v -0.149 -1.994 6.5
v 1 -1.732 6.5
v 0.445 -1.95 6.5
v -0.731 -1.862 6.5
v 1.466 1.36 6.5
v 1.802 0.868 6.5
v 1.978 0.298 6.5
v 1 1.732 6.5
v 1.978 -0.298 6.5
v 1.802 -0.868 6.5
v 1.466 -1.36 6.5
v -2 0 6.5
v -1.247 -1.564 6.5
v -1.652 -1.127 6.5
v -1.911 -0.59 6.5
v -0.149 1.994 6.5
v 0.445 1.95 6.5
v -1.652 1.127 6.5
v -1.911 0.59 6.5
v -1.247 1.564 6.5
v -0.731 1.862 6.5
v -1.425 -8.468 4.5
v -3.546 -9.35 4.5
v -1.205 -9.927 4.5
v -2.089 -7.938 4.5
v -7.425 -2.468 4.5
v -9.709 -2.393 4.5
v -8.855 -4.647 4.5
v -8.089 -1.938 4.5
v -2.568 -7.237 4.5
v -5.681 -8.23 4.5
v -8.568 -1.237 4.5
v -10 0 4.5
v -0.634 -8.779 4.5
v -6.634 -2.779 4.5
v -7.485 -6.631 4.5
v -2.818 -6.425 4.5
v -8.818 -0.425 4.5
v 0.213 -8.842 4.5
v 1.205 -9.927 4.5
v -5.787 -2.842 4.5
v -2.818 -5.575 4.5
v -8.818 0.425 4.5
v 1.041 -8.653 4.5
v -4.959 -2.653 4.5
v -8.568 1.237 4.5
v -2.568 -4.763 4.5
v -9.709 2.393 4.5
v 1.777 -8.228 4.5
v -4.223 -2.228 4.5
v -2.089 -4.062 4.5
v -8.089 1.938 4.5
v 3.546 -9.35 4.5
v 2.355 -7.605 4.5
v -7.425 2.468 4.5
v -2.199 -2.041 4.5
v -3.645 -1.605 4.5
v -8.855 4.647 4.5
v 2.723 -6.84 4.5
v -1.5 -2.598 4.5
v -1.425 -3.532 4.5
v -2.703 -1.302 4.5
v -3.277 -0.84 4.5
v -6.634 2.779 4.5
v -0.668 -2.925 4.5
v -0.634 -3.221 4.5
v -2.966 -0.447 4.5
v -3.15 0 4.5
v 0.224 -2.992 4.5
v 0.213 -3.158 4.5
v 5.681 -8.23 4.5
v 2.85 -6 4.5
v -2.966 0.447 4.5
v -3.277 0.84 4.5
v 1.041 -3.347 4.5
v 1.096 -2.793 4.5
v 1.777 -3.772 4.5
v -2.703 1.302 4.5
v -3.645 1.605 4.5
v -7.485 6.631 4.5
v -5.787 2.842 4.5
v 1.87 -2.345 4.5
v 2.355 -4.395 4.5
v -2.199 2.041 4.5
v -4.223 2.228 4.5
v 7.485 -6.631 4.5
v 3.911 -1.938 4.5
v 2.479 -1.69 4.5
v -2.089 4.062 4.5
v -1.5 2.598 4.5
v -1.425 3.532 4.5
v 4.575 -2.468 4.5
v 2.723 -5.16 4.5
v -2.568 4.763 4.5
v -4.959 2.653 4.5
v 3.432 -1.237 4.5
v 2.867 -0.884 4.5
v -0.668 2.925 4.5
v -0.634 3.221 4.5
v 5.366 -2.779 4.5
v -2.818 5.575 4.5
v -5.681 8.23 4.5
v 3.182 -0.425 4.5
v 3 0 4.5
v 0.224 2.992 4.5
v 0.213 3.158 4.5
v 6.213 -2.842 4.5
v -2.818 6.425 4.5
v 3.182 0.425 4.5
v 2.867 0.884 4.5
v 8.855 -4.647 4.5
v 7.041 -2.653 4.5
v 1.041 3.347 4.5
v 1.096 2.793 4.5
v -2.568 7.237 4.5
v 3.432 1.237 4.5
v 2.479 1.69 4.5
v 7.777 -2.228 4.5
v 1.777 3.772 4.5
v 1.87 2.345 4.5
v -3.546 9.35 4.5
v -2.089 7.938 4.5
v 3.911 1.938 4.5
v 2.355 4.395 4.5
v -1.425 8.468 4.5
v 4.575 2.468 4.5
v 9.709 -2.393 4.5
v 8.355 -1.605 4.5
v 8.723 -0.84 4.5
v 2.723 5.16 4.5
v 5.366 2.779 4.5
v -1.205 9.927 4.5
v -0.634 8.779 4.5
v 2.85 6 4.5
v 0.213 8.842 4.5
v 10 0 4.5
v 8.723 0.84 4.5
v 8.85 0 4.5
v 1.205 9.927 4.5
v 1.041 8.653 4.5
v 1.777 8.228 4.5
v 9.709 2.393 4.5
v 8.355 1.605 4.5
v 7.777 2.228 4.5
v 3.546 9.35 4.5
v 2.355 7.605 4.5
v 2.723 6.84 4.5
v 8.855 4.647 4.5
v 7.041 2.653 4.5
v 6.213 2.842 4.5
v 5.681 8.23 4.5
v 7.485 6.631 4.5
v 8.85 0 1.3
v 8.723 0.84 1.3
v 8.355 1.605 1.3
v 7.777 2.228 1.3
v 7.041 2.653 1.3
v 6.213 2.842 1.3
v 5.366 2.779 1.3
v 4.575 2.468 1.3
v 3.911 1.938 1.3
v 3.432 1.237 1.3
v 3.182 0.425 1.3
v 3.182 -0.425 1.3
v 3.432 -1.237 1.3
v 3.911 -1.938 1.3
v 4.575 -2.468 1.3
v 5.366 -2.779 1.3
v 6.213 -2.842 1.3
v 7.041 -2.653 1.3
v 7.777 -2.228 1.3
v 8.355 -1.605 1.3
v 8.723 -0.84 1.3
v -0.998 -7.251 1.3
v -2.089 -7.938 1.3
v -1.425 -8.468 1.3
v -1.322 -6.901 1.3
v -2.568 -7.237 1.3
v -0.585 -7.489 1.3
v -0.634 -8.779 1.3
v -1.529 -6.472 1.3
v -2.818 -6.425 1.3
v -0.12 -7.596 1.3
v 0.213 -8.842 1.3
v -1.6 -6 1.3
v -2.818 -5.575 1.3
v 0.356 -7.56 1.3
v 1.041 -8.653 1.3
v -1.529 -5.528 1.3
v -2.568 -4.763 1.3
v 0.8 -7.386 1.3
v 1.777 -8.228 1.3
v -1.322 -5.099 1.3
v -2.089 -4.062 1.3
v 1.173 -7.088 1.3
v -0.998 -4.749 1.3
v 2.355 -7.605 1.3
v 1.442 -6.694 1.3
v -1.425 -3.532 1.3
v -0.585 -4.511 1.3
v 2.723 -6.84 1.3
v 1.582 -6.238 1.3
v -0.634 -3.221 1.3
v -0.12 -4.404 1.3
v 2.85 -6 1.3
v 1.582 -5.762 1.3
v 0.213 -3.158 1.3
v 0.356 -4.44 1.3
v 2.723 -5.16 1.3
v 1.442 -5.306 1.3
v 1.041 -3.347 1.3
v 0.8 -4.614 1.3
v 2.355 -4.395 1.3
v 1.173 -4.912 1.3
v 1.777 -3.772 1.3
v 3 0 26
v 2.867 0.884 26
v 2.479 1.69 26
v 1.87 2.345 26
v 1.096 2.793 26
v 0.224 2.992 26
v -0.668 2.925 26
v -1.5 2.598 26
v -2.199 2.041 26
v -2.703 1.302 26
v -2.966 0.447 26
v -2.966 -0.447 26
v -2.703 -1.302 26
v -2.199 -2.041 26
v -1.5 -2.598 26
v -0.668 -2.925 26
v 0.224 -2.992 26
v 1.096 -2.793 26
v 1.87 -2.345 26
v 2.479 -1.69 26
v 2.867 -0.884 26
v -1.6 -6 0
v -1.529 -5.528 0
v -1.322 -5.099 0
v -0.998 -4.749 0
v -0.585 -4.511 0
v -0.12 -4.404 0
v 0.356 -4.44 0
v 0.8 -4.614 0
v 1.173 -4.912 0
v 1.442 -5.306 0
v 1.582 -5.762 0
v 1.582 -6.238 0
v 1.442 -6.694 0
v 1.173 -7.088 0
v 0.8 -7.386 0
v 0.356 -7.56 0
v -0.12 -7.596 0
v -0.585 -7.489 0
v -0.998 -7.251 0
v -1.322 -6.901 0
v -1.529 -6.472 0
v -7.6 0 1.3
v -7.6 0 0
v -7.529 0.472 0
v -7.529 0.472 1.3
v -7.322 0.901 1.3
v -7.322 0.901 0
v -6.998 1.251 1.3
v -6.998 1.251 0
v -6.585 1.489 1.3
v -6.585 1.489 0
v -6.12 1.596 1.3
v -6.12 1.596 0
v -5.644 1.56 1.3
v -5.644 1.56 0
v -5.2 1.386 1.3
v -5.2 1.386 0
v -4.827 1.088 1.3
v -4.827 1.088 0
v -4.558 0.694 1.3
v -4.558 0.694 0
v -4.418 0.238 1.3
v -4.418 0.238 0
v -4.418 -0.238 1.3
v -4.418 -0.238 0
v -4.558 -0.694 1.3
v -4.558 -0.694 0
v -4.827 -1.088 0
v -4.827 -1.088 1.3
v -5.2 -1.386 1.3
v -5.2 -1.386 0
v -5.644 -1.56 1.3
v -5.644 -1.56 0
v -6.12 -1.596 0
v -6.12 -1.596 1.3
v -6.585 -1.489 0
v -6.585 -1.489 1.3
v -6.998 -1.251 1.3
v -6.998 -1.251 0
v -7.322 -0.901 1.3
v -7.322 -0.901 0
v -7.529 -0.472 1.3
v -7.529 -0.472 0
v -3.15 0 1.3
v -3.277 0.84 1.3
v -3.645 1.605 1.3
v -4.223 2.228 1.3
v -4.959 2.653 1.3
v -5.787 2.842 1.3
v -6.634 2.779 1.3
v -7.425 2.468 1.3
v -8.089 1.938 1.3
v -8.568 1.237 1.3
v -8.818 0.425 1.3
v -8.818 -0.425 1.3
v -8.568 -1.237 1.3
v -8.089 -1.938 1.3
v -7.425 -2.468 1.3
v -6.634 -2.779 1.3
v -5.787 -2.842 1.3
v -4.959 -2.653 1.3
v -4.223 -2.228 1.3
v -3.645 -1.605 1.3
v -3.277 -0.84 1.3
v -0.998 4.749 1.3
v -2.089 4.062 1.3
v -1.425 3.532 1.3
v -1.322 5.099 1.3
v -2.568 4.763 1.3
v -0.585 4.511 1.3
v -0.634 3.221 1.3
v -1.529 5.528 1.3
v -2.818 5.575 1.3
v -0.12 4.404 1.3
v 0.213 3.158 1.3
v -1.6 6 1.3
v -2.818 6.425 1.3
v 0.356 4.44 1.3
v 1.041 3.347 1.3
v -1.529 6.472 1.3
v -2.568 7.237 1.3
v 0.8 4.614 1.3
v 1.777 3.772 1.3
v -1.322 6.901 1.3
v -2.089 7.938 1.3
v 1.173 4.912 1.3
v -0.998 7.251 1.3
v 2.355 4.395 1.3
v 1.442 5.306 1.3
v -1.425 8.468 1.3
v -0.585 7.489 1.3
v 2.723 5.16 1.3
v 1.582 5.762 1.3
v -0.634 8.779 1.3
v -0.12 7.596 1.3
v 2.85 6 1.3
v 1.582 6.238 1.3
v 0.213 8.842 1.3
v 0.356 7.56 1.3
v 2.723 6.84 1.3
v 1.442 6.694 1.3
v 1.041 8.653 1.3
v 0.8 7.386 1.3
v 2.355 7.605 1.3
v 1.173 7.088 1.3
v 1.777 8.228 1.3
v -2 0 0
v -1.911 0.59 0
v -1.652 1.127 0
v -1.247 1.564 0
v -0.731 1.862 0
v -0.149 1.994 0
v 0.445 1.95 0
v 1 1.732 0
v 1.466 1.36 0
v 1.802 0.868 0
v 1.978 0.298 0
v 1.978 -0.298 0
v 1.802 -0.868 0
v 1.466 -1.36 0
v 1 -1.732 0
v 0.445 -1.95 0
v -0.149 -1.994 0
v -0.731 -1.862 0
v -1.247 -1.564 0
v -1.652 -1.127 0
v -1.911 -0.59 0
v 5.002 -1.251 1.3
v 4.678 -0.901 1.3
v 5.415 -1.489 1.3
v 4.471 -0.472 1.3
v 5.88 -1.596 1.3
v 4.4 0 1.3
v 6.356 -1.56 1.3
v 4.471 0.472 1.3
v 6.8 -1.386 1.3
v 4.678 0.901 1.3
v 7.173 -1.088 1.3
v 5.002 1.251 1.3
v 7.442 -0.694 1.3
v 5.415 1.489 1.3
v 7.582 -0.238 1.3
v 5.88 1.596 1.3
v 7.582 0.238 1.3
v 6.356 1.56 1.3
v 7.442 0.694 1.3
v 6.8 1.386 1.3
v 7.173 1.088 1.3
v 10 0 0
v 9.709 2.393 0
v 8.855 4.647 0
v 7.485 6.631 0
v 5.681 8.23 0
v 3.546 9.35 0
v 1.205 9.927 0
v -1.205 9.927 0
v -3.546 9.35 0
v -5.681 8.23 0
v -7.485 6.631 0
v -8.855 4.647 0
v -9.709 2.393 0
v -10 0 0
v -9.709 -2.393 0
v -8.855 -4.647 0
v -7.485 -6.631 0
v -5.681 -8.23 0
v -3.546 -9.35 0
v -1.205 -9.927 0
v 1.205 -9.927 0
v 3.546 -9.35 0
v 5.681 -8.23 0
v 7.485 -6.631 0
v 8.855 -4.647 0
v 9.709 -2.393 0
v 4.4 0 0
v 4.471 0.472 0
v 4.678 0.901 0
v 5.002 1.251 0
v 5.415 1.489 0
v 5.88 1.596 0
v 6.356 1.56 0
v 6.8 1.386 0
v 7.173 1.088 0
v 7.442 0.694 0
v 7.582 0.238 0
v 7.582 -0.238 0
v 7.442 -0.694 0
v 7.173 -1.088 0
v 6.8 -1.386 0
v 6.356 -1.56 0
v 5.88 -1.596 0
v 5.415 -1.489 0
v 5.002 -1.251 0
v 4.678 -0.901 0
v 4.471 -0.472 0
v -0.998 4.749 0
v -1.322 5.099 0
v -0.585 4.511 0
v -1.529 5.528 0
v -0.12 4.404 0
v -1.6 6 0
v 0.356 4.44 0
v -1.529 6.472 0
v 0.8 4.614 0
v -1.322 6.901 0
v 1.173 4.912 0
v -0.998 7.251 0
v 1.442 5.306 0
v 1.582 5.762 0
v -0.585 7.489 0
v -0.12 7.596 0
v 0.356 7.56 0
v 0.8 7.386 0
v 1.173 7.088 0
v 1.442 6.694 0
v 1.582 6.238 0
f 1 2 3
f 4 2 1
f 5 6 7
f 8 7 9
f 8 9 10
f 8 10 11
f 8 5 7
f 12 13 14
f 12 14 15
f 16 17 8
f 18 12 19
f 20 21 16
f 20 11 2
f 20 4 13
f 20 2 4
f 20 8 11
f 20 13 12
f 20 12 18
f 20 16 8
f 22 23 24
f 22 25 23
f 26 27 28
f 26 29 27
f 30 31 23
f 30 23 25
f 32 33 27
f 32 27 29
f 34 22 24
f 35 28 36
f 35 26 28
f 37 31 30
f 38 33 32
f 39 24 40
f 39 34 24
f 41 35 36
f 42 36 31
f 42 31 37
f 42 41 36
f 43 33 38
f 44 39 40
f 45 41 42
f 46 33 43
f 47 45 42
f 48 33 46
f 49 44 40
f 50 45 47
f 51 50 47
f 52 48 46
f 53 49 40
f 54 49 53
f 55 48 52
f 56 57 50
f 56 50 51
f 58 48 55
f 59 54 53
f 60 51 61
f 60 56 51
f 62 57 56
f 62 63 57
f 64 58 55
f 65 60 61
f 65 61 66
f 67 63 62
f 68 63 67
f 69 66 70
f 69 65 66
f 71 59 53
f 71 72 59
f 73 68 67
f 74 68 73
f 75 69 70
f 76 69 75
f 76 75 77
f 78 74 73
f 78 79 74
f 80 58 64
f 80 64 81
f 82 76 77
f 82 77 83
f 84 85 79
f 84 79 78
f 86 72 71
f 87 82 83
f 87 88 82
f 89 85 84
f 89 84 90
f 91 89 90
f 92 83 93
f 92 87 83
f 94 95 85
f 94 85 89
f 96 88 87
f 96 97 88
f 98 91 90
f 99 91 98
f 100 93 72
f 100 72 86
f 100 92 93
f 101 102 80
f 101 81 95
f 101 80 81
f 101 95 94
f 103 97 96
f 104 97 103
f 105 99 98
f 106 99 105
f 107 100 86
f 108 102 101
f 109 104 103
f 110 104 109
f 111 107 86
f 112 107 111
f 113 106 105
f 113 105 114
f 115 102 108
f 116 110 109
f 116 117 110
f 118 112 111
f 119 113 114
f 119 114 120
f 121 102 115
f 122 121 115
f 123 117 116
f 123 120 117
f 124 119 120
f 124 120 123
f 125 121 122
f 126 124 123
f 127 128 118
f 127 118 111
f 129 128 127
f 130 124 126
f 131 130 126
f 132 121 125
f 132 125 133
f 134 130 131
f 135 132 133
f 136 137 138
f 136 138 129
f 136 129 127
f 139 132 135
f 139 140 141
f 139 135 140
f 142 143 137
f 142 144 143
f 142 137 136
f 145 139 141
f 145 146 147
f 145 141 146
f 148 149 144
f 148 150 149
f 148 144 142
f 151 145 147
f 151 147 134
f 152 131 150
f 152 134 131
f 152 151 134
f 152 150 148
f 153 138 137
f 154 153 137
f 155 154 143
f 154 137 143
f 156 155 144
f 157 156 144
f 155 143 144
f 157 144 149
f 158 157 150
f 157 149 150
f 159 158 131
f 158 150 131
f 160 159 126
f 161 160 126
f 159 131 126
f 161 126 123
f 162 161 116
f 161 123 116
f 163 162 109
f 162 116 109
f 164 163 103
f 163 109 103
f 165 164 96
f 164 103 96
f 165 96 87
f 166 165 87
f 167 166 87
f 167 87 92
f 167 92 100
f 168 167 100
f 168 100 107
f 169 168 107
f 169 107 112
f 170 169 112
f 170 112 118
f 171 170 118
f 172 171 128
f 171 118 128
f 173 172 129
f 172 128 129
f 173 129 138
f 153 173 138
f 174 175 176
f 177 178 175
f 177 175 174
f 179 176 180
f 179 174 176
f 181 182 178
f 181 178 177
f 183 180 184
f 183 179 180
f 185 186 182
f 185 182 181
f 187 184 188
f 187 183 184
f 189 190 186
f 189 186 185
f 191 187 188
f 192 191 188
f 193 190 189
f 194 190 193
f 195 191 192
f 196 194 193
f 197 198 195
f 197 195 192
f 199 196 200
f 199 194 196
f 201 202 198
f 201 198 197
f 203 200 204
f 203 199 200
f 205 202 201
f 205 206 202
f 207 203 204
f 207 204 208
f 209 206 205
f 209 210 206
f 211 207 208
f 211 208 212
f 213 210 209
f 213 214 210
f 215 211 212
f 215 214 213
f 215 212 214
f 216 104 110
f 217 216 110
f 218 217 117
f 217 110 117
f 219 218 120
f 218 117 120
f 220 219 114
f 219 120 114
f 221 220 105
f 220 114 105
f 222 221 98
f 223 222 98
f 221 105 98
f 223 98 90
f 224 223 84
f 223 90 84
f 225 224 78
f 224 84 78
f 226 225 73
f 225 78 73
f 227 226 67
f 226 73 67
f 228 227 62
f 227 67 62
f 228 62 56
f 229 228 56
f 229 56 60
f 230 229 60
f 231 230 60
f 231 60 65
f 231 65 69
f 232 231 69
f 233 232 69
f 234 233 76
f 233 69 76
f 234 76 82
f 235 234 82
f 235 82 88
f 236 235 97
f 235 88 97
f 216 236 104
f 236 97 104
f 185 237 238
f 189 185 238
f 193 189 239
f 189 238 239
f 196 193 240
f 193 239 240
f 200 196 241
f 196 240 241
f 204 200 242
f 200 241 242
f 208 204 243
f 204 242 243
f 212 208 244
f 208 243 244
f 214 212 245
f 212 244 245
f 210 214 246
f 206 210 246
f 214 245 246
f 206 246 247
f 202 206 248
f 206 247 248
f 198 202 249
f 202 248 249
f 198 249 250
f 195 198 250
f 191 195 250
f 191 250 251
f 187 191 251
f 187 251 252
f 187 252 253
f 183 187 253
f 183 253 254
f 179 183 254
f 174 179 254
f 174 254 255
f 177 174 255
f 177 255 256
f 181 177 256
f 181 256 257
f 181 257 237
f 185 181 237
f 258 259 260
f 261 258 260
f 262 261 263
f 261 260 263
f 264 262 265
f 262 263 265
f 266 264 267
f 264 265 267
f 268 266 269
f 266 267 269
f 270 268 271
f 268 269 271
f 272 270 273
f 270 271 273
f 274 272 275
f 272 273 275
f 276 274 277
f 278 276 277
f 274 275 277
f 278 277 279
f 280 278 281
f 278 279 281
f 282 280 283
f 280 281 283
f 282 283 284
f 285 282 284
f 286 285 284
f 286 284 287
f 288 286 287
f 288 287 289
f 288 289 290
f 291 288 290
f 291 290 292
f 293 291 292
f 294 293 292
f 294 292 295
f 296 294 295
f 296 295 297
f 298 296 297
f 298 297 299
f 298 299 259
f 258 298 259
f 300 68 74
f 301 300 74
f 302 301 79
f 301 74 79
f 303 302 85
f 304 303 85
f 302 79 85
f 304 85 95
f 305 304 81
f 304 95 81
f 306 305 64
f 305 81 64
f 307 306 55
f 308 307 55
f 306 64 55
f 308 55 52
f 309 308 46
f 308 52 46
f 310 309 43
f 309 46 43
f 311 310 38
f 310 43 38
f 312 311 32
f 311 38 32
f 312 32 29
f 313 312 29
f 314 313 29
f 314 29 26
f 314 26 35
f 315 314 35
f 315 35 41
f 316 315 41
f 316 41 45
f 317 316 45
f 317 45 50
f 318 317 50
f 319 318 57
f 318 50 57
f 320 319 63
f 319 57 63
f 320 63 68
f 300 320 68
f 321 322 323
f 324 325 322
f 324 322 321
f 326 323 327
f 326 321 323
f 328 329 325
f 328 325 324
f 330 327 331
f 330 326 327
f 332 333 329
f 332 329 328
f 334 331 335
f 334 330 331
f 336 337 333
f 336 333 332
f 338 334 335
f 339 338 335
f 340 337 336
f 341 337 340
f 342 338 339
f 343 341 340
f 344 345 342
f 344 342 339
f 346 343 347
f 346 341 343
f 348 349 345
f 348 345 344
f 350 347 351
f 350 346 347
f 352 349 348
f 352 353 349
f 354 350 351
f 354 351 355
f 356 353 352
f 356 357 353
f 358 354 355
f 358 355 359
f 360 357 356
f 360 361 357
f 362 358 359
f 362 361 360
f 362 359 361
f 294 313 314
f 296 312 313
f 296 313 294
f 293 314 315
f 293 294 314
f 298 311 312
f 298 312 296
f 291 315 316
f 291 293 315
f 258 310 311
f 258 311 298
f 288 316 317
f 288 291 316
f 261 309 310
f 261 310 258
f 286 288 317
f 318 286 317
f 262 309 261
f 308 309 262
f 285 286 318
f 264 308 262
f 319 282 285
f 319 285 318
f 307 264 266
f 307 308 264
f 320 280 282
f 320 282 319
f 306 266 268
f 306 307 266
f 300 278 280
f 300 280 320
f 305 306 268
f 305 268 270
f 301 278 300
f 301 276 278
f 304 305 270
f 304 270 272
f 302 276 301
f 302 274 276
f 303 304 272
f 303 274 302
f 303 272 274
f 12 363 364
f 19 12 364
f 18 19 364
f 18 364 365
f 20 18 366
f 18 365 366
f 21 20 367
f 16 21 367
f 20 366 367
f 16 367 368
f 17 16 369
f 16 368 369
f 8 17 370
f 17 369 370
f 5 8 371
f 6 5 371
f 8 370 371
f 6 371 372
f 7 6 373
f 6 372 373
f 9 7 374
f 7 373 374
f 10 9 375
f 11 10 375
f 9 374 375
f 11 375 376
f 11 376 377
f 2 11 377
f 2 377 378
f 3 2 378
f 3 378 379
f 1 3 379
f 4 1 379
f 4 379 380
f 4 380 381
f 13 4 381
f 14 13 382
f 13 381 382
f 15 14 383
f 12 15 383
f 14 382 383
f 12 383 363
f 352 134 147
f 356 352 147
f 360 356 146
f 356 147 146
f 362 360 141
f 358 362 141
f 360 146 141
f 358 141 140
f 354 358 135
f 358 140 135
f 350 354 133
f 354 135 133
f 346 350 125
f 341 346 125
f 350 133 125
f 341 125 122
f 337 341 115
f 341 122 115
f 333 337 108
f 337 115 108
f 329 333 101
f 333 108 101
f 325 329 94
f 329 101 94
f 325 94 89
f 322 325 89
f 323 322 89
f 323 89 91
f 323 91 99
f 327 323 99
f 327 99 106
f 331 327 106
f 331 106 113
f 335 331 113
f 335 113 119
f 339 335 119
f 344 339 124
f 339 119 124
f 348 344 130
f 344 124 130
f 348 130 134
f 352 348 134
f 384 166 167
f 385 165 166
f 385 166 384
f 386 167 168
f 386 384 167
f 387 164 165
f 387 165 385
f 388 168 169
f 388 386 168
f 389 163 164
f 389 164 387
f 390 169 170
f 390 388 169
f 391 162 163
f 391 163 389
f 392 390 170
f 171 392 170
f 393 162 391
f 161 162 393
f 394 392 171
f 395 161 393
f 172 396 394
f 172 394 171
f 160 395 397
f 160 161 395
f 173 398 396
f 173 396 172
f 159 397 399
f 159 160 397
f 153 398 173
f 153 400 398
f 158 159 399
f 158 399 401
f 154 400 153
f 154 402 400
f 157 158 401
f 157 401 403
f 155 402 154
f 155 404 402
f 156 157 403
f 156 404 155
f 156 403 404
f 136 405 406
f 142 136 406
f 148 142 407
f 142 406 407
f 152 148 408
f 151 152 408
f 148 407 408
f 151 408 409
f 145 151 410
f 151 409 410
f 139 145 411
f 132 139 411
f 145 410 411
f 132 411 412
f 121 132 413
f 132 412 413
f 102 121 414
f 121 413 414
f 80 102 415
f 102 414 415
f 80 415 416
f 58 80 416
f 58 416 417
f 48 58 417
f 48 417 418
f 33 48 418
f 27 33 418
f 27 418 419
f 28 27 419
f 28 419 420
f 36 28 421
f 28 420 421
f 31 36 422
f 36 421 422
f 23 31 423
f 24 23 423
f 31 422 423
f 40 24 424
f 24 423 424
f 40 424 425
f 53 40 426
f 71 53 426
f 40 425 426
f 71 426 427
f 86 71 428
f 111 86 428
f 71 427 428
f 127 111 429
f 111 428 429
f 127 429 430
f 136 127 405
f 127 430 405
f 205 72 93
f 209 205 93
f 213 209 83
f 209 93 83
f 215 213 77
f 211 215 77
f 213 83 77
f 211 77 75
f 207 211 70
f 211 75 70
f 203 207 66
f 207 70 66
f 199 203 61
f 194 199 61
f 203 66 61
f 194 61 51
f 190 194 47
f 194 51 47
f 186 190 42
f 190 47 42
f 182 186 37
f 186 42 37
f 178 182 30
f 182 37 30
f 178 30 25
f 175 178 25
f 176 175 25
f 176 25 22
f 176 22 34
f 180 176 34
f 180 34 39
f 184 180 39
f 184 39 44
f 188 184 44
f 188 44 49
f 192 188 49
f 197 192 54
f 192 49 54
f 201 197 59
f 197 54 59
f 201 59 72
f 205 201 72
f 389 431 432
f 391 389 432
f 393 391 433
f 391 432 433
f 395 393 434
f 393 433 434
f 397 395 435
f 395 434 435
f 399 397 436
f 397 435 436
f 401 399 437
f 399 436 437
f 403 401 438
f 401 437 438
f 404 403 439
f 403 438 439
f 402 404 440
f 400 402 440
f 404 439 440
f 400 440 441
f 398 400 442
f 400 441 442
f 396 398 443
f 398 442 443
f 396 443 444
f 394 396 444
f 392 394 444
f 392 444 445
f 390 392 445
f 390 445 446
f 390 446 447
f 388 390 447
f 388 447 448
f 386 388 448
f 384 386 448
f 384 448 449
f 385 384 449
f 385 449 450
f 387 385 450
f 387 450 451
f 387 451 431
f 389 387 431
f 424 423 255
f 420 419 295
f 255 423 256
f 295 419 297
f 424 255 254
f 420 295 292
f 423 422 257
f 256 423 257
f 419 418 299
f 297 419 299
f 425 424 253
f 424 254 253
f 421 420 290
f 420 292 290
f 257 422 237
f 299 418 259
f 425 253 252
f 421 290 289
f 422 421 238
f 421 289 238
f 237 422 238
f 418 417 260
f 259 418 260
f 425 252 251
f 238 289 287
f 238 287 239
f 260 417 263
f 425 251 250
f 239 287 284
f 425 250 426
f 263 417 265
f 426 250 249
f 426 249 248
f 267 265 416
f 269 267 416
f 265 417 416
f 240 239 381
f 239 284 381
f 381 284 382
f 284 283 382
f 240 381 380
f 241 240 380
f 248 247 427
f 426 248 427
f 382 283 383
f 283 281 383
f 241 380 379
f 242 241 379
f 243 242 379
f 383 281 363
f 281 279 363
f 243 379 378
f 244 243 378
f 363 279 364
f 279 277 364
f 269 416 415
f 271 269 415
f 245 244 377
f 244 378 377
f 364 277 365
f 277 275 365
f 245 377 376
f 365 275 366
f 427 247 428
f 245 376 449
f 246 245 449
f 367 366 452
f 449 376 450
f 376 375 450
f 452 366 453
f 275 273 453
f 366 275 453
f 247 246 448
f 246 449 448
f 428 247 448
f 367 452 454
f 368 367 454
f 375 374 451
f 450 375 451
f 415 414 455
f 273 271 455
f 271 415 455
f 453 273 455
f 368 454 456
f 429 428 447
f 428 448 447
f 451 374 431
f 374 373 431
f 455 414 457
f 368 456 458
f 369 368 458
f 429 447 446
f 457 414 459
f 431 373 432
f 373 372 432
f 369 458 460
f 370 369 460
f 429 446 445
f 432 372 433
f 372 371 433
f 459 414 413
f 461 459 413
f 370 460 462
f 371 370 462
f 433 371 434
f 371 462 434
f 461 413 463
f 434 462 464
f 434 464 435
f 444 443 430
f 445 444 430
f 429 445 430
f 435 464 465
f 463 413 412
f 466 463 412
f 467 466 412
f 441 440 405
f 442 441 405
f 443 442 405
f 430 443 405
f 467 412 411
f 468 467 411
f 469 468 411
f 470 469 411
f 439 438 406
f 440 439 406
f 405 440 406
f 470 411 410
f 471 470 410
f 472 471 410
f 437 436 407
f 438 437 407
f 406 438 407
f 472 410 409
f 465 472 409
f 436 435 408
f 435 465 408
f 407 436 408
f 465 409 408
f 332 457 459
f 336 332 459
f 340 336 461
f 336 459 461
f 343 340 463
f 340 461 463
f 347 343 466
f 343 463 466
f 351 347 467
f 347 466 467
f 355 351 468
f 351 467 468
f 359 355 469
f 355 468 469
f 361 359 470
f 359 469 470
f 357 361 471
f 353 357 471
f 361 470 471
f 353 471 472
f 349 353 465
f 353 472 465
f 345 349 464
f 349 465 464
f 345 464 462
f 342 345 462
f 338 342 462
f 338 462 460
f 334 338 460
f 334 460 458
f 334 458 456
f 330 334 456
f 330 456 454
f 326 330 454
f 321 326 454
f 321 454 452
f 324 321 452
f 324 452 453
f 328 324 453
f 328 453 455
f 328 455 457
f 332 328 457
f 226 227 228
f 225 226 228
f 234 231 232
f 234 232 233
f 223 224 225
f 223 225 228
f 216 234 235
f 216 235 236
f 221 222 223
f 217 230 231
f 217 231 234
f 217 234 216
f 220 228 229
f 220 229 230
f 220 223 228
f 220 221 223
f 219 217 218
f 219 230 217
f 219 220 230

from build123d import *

# Parameters (mm, degrees)
SKETCH1_R           = 10
BOSS_EXTRUDE1_DEPTH = 4.5
SKETCH2_R           = 3
BOSS_EXTRUDE2_DEPTH = 21.5
SKETCH3_R           = 2
CUT_EXTRUDE1_DEPTH  = 6.5
SKETCH4_R           = 1.6
CUT_EXTRUDE2_DEPTH  = 27
SKETCH5_R           = 2.85
CUT_EXTRUDE3_DEPTH  = 3.2


with BuildPart() as part:
    # Sketch1 → Boss-Extrude1 (new body)
    with BuildSketch(Plane.XY):
        Circle(SKETCH1_R)
    extrude(amount=BOSS_EXTRUDE1_DEPTH)

    # Sketch2 → Boss-Extrude2 (add)
    with BuildSketch(Plane.XY.offset(4.5)):
        Circle(SKETCH2_R)
    extrude(amount=BOSS_EXTRUDE2_DEPTH)

    # Sketch3 → Cut-Extrude1 (cut)
    with BuildSketch(Plane(origin=(0, 0, 0), x_dir=(-1, 0, 0), z_dir=(0, 0, -1))):
        Circle(SKETCH3_R)
    extrude(amount=-CUT_EXTRUDE1_DEPTH, mode=Mode.SUBTRACT)

    # Sketch4 → Cut-Extrude2 (cut, through all)
    with BuildSketch(Plane(origin=(0, 0, 0), x_dir=(-1, 0, 0), z_dir=(0, 0, -1))):
        with Locations((0, 6)):
            Circle(SKETCH4_R)
        with Locations((6, 0)):
            Circle(SKETCH4_R)
        with Locations((0, -6)):
            Circle(SKETCH4_R)
        with Locations((-6, 0)):
            Circle(SKETCH4_R)
    extrude(amount=-CUT_EXTRUDE2_DEPTH, mode=Mode.SUBTRACT)

    # Sketch5 → Cut-Extrude3 (cut)
    with BuildSketch(Plane.XY.offset(4.5)):
        with Locations((0, 6)):
            Circle(SKETCH5_R)
        with Locations((6, 0)):
            Circle(SKETCH5_R)
        with Locations((0, -6)):
            Circle(SKETCH5_R)
        with Locations((-6, 0)):
            Circle(SKETCH5_R)
    extrude(amount=-CUT_EXTRUDE3_DEPTH, mode=Mode.SUBTRACT)


solid = part.part
